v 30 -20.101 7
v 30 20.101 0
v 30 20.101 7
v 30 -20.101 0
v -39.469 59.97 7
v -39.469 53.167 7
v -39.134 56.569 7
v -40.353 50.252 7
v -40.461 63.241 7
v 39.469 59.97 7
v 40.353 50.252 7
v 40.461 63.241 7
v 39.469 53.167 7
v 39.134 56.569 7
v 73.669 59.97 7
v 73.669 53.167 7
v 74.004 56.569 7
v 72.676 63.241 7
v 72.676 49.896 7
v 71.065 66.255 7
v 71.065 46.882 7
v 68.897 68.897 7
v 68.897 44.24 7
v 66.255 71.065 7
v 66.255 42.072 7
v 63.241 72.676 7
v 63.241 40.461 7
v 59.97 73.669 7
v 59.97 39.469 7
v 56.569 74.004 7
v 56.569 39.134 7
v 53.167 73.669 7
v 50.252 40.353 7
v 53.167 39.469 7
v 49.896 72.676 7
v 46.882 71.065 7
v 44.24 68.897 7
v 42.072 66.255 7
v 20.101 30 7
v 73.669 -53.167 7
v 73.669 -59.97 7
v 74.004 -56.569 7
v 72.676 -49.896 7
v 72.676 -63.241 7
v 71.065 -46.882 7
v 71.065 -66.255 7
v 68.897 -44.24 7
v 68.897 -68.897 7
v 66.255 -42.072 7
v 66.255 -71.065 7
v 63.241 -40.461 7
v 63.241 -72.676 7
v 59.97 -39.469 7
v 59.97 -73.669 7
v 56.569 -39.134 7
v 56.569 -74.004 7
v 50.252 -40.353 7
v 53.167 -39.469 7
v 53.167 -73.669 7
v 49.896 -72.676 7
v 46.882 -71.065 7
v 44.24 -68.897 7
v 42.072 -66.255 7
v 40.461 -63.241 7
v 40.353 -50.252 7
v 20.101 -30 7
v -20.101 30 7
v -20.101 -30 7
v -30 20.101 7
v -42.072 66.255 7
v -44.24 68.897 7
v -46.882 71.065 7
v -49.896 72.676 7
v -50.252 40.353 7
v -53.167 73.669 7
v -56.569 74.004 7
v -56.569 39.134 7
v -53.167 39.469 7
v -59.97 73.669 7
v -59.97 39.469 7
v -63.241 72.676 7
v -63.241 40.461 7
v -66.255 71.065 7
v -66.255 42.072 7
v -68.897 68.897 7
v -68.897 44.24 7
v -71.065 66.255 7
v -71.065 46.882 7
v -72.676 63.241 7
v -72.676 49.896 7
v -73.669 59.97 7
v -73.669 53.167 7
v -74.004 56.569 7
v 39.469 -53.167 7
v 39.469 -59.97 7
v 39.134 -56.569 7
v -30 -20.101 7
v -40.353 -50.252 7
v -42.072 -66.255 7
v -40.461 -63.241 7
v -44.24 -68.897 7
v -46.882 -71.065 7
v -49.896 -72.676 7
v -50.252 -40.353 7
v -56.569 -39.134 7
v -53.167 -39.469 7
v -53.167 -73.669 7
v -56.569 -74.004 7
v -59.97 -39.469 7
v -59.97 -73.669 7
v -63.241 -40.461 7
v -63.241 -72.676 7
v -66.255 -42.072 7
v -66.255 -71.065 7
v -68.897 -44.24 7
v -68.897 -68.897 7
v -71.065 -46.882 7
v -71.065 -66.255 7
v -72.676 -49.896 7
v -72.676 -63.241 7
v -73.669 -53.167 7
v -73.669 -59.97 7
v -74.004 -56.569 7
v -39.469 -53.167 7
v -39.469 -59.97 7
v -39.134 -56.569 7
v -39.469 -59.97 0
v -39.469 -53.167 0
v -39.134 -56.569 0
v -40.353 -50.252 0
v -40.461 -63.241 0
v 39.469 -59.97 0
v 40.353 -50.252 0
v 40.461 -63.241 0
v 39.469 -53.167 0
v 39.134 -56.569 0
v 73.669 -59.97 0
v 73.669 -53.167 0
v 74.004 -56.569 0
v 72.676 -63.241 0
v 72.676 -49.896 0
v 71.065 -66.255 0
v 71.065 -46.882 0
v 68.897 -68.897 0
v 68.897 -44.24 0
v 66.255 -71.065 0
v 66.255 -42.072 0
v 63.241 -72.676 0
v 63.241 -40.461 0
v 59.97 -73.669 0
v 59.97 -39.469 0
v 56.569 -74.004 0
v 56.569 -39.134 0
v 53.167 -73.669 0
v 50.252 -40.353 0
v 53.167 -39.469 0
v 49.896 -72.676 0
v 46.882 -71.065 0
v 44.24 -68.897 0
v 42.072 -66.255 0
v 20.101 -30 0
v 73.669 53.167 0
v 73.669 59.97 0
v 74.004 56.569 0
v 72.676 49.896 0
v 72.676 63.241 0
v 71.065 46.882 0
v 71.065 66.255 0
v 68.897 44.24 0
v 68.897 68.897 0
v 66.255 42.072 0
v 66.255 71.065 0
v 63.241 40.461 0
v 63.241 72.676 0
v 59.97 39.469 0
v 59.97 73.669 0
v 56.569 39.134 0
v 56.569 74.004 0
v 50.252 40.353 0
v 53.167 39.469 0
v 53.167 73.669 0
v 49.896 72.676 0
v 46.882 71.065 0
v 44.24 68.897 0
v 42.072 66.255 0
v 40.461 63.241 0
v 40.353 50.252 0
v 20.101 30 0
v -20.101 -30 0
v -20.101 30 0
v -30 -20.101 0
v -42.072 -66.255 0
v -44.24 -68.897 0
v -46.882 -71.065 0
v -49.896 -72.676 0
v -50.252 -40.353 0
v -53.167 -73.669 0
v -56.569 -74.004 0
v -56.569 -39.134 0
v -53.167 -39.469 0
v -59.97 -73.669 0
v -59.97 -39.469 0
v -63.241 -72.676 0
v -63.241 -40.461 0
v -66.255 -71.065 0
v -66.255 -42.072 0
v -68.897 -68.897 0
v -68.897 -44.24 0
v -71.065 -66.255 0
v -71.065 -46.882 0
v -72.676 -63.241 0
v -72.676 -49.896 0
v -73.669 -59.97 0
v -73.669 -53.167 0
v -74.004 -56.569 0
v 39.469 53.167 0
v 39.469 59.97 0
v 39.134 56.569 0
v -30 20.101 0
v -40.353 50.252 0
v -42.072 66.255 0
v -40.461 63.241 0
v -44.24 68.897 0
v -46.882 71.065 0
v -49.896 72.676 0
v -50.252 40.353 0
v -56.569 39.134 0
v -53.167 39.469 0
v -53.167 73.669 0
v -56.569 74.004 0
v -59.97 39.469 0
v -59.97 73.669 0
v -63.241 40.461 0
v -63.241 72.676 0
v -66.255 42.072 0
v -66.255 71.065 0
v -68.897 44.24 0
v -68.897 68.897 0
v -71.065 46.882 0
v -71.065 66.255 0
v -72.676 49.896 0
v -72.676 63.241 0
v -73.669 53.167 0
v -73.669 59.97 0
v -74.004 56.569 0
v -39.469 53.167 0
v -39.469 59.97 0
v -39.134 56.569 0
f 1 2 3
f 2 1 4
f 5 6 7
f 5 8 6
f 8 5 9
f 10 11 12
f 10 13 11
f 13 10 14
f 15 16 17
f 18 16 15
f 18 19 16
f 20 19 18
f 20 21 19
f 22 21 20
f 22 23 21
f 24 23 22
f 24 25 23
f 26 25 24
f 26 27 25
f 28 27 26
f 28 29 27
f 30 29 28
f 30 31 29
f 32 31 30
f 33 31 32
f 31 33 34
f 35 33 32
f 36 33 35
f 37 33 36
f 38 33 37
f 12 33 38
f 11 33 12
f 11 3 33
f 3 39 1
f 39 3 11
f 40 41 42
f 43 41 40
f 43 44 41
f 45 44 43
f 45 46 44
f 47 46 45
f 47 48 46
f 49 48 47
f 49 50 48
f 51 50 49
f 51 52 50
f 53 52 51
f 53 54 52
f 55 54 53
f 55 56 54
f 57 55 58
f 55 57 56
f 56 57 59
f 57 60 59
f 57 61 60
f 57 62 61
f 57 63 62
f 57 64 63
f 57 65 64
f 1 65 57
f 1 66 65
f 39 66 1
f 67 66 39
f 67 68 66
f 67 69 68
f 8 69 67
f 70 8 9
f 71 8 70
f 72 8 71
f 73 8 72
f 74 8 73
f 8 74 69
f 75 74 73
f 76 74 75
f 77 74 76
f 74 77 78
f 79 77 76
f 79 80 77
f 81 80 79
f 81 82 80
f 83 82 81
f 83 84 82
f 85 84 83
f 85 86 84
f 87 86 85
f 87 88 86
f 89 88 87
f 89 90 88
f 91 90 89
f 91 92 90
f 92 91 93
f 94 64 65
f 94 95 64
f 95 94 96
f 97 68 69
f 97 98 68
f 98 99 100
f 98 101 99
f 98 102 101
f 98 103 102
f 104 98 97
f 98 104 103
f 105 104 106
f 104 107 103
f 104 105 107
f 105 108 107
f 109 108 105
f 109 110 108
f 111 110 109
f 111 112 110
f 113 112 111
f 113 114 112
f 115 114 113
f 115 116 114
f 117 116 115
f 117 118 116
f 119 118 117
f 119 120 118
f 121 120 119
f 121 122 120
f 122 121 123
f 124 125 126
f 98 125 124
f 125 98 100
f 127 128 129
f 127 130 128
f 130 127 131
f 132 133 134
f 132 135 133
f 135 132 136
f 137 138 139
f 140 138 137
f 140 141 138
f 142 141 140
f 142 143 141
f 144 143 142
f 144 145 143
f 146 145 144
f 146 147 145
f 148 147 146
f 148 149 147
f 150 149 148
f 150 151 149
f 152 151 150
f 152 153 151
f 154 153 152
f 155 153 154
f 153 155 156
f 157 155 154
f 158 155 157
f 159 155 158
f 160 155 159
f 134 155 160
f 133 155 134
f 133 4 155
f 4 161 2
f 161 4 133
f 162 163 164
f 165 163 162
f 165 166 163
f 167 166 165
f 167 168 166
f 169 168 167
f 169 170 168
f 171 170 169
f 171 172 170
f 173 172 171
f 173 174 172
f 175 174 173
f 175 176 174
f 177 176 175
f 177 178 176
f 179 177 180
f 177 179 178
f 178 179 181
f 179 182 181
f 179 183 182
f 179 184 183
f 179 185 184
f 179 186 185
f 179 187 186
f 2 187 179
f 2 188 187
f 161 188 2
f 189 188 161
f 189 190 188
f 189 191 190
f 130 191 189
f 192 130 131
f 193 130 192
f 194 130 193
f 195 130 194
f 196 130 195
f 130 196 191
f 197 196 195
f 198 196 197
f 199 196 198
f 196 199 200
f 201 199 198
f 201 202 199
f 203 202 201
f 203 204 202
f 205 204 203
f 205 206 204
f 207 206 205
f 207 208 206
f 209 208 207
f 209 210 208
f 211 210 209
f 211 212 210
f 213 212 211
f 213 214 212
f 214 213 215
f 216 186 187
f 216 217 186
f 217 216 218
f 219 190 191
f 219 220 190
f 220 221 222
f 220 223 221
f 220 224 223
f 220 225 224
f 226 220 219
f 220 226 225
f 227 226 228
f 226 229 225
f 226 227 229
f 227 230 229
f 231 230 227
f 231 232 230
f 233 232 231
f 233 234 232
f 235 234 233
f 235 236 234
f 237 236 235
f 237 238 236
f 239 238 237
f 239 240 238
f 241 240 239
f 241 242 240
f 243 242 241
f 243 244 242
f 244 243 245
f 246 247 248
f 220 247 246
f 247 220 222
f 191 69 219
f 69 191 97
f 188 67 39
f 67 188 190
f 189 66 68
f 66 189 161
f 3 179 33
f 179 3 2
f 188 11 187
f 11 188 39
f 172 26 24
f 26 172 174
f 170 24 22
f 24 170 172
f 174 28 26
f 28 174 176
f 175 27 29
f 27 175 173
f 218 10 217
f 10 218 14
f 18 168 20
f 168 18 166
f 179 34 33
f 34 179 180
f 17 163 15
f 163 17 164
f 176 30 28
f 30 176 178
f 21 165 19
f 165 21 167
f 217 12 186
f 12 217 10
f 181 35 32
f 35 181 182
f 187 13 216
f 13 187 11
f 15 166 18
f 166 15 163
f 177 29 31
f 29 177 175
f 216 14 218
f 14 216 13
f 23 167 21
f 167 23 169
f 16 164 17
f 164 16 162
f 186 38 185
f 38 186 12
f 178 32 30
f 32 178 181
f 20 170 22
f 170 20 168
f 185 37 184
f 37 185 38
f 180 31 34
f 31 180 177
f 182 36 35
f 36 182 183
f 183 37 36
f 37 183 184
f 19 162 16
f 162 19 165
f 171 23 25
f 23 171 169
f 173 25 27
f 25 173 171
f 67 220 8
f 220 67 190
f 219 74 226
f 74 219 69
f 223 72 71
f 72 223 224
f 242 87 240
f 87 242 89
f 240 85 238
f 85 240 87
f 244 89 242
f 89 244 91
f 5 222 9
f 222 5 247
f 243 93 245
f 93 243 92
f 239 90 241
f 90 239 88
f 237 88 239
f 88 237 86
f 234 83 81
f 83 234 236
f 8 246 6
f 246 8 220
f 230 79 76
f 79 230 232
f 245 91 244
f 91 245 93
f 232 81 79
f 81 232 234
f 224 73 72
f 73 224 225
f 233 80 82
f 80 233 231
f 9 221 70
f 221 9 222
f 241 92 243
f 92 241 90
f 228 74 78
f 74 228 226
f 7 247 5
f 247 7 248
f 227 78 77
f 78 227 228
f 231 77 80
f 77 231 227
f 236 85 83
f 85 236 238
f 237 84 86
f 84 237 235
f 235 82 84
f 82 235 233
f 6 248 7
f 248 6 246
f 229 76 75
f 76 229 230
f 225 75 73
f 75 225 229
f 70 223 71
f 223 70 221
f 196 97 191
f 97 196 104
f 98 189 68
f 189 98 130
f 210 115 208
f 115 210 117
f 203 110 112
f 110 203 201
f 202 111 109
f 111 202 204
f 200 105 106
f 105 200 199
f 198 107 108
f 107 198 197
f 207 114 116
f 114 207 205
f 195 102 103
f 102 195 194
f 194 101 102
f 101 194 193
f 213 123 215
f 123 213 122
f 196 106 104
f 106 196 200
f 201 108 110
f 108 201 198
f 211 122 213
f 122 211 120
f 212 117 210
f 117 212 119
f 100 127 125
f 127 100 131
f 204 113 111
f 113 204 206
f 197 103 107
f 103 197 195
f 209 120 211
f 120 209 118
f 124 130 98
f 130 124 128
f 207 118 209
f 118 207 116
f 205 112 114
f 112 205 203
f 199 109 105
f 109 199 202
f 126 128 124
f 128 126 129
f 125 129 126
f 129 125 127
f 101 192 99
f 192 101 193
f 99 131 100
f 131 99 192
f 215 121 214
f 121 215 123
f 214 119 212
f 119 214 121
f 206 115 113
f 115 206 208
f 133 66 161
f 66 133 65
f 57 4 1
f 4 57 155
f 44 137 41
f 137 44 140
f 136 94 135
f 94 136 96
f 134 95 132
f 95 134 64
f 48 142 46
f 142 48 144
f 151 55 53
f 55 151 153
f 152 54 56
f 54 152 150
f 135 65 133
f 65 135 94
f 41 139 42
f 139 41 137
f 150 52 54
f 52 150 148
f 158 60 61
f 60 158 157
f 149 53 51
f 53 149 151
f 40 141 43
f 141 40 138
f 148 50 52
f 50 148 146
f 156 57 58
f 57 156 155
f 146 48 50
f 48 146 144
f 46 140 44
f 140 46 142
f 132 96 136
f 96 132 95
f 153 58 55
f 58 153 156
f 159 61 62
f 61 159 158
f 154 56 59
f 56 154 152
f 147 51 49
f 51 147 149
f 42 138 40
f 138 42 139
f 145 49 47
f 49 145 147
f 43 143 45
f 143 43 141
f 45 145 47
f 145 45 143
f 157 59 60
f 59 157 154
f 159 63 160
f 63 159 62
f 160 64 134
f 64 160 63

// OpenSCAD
$fn = 32;

// ----------------------------------------------------------------------
// Quadcopter frame: 194.88 mm across the motor pads, arms 80 mm
// ----------------------------------------------------------------------

// --- parameters (mm) ---
hub = 60;                 // central plate size
plate_t = 7;              // plate thickness
arm_len = 80;             // hub centre to motor pad centre
bar_w = 14;               // arm width
pad_d = 34.87;            // motor pad diameter

module arm_bar() {
  /* flat bar: hull of a stub inside the hub and a box at the pad */
  hull() {
    translate([hub / 4, 0, plate_t / 2]) cube([bar_w, bar_w, plate_t], center = true);
    translate([arm_len, 0, plate_t / 2]) cube([bar_w, bar_w, plate_t], center = true);
  }
}

module pad() {
  translate([arm_len, 0, 0]) cylinder(h = plate_t, d = pad_d);
}

module frame() {
  translate([-hub / 2, -hub / 2, 0]) cube([hub, hub, plate_t]);
  rotate([0, 0, 45]) arm_bar();
  rotate([0, 0, 45]) pad();
  rotate([0, 0, 135]) arm_bar();
  rotate([0, 0, 135]) pad();
  rotate([0, 0, 225]) arm_bar();
  rotate([0, 0, 225]) pad();
  rotate([0, 0, 315]) arm_bar();
  rotate([0, 0, 315]) pad();
}

difference() {
  frame();
}
